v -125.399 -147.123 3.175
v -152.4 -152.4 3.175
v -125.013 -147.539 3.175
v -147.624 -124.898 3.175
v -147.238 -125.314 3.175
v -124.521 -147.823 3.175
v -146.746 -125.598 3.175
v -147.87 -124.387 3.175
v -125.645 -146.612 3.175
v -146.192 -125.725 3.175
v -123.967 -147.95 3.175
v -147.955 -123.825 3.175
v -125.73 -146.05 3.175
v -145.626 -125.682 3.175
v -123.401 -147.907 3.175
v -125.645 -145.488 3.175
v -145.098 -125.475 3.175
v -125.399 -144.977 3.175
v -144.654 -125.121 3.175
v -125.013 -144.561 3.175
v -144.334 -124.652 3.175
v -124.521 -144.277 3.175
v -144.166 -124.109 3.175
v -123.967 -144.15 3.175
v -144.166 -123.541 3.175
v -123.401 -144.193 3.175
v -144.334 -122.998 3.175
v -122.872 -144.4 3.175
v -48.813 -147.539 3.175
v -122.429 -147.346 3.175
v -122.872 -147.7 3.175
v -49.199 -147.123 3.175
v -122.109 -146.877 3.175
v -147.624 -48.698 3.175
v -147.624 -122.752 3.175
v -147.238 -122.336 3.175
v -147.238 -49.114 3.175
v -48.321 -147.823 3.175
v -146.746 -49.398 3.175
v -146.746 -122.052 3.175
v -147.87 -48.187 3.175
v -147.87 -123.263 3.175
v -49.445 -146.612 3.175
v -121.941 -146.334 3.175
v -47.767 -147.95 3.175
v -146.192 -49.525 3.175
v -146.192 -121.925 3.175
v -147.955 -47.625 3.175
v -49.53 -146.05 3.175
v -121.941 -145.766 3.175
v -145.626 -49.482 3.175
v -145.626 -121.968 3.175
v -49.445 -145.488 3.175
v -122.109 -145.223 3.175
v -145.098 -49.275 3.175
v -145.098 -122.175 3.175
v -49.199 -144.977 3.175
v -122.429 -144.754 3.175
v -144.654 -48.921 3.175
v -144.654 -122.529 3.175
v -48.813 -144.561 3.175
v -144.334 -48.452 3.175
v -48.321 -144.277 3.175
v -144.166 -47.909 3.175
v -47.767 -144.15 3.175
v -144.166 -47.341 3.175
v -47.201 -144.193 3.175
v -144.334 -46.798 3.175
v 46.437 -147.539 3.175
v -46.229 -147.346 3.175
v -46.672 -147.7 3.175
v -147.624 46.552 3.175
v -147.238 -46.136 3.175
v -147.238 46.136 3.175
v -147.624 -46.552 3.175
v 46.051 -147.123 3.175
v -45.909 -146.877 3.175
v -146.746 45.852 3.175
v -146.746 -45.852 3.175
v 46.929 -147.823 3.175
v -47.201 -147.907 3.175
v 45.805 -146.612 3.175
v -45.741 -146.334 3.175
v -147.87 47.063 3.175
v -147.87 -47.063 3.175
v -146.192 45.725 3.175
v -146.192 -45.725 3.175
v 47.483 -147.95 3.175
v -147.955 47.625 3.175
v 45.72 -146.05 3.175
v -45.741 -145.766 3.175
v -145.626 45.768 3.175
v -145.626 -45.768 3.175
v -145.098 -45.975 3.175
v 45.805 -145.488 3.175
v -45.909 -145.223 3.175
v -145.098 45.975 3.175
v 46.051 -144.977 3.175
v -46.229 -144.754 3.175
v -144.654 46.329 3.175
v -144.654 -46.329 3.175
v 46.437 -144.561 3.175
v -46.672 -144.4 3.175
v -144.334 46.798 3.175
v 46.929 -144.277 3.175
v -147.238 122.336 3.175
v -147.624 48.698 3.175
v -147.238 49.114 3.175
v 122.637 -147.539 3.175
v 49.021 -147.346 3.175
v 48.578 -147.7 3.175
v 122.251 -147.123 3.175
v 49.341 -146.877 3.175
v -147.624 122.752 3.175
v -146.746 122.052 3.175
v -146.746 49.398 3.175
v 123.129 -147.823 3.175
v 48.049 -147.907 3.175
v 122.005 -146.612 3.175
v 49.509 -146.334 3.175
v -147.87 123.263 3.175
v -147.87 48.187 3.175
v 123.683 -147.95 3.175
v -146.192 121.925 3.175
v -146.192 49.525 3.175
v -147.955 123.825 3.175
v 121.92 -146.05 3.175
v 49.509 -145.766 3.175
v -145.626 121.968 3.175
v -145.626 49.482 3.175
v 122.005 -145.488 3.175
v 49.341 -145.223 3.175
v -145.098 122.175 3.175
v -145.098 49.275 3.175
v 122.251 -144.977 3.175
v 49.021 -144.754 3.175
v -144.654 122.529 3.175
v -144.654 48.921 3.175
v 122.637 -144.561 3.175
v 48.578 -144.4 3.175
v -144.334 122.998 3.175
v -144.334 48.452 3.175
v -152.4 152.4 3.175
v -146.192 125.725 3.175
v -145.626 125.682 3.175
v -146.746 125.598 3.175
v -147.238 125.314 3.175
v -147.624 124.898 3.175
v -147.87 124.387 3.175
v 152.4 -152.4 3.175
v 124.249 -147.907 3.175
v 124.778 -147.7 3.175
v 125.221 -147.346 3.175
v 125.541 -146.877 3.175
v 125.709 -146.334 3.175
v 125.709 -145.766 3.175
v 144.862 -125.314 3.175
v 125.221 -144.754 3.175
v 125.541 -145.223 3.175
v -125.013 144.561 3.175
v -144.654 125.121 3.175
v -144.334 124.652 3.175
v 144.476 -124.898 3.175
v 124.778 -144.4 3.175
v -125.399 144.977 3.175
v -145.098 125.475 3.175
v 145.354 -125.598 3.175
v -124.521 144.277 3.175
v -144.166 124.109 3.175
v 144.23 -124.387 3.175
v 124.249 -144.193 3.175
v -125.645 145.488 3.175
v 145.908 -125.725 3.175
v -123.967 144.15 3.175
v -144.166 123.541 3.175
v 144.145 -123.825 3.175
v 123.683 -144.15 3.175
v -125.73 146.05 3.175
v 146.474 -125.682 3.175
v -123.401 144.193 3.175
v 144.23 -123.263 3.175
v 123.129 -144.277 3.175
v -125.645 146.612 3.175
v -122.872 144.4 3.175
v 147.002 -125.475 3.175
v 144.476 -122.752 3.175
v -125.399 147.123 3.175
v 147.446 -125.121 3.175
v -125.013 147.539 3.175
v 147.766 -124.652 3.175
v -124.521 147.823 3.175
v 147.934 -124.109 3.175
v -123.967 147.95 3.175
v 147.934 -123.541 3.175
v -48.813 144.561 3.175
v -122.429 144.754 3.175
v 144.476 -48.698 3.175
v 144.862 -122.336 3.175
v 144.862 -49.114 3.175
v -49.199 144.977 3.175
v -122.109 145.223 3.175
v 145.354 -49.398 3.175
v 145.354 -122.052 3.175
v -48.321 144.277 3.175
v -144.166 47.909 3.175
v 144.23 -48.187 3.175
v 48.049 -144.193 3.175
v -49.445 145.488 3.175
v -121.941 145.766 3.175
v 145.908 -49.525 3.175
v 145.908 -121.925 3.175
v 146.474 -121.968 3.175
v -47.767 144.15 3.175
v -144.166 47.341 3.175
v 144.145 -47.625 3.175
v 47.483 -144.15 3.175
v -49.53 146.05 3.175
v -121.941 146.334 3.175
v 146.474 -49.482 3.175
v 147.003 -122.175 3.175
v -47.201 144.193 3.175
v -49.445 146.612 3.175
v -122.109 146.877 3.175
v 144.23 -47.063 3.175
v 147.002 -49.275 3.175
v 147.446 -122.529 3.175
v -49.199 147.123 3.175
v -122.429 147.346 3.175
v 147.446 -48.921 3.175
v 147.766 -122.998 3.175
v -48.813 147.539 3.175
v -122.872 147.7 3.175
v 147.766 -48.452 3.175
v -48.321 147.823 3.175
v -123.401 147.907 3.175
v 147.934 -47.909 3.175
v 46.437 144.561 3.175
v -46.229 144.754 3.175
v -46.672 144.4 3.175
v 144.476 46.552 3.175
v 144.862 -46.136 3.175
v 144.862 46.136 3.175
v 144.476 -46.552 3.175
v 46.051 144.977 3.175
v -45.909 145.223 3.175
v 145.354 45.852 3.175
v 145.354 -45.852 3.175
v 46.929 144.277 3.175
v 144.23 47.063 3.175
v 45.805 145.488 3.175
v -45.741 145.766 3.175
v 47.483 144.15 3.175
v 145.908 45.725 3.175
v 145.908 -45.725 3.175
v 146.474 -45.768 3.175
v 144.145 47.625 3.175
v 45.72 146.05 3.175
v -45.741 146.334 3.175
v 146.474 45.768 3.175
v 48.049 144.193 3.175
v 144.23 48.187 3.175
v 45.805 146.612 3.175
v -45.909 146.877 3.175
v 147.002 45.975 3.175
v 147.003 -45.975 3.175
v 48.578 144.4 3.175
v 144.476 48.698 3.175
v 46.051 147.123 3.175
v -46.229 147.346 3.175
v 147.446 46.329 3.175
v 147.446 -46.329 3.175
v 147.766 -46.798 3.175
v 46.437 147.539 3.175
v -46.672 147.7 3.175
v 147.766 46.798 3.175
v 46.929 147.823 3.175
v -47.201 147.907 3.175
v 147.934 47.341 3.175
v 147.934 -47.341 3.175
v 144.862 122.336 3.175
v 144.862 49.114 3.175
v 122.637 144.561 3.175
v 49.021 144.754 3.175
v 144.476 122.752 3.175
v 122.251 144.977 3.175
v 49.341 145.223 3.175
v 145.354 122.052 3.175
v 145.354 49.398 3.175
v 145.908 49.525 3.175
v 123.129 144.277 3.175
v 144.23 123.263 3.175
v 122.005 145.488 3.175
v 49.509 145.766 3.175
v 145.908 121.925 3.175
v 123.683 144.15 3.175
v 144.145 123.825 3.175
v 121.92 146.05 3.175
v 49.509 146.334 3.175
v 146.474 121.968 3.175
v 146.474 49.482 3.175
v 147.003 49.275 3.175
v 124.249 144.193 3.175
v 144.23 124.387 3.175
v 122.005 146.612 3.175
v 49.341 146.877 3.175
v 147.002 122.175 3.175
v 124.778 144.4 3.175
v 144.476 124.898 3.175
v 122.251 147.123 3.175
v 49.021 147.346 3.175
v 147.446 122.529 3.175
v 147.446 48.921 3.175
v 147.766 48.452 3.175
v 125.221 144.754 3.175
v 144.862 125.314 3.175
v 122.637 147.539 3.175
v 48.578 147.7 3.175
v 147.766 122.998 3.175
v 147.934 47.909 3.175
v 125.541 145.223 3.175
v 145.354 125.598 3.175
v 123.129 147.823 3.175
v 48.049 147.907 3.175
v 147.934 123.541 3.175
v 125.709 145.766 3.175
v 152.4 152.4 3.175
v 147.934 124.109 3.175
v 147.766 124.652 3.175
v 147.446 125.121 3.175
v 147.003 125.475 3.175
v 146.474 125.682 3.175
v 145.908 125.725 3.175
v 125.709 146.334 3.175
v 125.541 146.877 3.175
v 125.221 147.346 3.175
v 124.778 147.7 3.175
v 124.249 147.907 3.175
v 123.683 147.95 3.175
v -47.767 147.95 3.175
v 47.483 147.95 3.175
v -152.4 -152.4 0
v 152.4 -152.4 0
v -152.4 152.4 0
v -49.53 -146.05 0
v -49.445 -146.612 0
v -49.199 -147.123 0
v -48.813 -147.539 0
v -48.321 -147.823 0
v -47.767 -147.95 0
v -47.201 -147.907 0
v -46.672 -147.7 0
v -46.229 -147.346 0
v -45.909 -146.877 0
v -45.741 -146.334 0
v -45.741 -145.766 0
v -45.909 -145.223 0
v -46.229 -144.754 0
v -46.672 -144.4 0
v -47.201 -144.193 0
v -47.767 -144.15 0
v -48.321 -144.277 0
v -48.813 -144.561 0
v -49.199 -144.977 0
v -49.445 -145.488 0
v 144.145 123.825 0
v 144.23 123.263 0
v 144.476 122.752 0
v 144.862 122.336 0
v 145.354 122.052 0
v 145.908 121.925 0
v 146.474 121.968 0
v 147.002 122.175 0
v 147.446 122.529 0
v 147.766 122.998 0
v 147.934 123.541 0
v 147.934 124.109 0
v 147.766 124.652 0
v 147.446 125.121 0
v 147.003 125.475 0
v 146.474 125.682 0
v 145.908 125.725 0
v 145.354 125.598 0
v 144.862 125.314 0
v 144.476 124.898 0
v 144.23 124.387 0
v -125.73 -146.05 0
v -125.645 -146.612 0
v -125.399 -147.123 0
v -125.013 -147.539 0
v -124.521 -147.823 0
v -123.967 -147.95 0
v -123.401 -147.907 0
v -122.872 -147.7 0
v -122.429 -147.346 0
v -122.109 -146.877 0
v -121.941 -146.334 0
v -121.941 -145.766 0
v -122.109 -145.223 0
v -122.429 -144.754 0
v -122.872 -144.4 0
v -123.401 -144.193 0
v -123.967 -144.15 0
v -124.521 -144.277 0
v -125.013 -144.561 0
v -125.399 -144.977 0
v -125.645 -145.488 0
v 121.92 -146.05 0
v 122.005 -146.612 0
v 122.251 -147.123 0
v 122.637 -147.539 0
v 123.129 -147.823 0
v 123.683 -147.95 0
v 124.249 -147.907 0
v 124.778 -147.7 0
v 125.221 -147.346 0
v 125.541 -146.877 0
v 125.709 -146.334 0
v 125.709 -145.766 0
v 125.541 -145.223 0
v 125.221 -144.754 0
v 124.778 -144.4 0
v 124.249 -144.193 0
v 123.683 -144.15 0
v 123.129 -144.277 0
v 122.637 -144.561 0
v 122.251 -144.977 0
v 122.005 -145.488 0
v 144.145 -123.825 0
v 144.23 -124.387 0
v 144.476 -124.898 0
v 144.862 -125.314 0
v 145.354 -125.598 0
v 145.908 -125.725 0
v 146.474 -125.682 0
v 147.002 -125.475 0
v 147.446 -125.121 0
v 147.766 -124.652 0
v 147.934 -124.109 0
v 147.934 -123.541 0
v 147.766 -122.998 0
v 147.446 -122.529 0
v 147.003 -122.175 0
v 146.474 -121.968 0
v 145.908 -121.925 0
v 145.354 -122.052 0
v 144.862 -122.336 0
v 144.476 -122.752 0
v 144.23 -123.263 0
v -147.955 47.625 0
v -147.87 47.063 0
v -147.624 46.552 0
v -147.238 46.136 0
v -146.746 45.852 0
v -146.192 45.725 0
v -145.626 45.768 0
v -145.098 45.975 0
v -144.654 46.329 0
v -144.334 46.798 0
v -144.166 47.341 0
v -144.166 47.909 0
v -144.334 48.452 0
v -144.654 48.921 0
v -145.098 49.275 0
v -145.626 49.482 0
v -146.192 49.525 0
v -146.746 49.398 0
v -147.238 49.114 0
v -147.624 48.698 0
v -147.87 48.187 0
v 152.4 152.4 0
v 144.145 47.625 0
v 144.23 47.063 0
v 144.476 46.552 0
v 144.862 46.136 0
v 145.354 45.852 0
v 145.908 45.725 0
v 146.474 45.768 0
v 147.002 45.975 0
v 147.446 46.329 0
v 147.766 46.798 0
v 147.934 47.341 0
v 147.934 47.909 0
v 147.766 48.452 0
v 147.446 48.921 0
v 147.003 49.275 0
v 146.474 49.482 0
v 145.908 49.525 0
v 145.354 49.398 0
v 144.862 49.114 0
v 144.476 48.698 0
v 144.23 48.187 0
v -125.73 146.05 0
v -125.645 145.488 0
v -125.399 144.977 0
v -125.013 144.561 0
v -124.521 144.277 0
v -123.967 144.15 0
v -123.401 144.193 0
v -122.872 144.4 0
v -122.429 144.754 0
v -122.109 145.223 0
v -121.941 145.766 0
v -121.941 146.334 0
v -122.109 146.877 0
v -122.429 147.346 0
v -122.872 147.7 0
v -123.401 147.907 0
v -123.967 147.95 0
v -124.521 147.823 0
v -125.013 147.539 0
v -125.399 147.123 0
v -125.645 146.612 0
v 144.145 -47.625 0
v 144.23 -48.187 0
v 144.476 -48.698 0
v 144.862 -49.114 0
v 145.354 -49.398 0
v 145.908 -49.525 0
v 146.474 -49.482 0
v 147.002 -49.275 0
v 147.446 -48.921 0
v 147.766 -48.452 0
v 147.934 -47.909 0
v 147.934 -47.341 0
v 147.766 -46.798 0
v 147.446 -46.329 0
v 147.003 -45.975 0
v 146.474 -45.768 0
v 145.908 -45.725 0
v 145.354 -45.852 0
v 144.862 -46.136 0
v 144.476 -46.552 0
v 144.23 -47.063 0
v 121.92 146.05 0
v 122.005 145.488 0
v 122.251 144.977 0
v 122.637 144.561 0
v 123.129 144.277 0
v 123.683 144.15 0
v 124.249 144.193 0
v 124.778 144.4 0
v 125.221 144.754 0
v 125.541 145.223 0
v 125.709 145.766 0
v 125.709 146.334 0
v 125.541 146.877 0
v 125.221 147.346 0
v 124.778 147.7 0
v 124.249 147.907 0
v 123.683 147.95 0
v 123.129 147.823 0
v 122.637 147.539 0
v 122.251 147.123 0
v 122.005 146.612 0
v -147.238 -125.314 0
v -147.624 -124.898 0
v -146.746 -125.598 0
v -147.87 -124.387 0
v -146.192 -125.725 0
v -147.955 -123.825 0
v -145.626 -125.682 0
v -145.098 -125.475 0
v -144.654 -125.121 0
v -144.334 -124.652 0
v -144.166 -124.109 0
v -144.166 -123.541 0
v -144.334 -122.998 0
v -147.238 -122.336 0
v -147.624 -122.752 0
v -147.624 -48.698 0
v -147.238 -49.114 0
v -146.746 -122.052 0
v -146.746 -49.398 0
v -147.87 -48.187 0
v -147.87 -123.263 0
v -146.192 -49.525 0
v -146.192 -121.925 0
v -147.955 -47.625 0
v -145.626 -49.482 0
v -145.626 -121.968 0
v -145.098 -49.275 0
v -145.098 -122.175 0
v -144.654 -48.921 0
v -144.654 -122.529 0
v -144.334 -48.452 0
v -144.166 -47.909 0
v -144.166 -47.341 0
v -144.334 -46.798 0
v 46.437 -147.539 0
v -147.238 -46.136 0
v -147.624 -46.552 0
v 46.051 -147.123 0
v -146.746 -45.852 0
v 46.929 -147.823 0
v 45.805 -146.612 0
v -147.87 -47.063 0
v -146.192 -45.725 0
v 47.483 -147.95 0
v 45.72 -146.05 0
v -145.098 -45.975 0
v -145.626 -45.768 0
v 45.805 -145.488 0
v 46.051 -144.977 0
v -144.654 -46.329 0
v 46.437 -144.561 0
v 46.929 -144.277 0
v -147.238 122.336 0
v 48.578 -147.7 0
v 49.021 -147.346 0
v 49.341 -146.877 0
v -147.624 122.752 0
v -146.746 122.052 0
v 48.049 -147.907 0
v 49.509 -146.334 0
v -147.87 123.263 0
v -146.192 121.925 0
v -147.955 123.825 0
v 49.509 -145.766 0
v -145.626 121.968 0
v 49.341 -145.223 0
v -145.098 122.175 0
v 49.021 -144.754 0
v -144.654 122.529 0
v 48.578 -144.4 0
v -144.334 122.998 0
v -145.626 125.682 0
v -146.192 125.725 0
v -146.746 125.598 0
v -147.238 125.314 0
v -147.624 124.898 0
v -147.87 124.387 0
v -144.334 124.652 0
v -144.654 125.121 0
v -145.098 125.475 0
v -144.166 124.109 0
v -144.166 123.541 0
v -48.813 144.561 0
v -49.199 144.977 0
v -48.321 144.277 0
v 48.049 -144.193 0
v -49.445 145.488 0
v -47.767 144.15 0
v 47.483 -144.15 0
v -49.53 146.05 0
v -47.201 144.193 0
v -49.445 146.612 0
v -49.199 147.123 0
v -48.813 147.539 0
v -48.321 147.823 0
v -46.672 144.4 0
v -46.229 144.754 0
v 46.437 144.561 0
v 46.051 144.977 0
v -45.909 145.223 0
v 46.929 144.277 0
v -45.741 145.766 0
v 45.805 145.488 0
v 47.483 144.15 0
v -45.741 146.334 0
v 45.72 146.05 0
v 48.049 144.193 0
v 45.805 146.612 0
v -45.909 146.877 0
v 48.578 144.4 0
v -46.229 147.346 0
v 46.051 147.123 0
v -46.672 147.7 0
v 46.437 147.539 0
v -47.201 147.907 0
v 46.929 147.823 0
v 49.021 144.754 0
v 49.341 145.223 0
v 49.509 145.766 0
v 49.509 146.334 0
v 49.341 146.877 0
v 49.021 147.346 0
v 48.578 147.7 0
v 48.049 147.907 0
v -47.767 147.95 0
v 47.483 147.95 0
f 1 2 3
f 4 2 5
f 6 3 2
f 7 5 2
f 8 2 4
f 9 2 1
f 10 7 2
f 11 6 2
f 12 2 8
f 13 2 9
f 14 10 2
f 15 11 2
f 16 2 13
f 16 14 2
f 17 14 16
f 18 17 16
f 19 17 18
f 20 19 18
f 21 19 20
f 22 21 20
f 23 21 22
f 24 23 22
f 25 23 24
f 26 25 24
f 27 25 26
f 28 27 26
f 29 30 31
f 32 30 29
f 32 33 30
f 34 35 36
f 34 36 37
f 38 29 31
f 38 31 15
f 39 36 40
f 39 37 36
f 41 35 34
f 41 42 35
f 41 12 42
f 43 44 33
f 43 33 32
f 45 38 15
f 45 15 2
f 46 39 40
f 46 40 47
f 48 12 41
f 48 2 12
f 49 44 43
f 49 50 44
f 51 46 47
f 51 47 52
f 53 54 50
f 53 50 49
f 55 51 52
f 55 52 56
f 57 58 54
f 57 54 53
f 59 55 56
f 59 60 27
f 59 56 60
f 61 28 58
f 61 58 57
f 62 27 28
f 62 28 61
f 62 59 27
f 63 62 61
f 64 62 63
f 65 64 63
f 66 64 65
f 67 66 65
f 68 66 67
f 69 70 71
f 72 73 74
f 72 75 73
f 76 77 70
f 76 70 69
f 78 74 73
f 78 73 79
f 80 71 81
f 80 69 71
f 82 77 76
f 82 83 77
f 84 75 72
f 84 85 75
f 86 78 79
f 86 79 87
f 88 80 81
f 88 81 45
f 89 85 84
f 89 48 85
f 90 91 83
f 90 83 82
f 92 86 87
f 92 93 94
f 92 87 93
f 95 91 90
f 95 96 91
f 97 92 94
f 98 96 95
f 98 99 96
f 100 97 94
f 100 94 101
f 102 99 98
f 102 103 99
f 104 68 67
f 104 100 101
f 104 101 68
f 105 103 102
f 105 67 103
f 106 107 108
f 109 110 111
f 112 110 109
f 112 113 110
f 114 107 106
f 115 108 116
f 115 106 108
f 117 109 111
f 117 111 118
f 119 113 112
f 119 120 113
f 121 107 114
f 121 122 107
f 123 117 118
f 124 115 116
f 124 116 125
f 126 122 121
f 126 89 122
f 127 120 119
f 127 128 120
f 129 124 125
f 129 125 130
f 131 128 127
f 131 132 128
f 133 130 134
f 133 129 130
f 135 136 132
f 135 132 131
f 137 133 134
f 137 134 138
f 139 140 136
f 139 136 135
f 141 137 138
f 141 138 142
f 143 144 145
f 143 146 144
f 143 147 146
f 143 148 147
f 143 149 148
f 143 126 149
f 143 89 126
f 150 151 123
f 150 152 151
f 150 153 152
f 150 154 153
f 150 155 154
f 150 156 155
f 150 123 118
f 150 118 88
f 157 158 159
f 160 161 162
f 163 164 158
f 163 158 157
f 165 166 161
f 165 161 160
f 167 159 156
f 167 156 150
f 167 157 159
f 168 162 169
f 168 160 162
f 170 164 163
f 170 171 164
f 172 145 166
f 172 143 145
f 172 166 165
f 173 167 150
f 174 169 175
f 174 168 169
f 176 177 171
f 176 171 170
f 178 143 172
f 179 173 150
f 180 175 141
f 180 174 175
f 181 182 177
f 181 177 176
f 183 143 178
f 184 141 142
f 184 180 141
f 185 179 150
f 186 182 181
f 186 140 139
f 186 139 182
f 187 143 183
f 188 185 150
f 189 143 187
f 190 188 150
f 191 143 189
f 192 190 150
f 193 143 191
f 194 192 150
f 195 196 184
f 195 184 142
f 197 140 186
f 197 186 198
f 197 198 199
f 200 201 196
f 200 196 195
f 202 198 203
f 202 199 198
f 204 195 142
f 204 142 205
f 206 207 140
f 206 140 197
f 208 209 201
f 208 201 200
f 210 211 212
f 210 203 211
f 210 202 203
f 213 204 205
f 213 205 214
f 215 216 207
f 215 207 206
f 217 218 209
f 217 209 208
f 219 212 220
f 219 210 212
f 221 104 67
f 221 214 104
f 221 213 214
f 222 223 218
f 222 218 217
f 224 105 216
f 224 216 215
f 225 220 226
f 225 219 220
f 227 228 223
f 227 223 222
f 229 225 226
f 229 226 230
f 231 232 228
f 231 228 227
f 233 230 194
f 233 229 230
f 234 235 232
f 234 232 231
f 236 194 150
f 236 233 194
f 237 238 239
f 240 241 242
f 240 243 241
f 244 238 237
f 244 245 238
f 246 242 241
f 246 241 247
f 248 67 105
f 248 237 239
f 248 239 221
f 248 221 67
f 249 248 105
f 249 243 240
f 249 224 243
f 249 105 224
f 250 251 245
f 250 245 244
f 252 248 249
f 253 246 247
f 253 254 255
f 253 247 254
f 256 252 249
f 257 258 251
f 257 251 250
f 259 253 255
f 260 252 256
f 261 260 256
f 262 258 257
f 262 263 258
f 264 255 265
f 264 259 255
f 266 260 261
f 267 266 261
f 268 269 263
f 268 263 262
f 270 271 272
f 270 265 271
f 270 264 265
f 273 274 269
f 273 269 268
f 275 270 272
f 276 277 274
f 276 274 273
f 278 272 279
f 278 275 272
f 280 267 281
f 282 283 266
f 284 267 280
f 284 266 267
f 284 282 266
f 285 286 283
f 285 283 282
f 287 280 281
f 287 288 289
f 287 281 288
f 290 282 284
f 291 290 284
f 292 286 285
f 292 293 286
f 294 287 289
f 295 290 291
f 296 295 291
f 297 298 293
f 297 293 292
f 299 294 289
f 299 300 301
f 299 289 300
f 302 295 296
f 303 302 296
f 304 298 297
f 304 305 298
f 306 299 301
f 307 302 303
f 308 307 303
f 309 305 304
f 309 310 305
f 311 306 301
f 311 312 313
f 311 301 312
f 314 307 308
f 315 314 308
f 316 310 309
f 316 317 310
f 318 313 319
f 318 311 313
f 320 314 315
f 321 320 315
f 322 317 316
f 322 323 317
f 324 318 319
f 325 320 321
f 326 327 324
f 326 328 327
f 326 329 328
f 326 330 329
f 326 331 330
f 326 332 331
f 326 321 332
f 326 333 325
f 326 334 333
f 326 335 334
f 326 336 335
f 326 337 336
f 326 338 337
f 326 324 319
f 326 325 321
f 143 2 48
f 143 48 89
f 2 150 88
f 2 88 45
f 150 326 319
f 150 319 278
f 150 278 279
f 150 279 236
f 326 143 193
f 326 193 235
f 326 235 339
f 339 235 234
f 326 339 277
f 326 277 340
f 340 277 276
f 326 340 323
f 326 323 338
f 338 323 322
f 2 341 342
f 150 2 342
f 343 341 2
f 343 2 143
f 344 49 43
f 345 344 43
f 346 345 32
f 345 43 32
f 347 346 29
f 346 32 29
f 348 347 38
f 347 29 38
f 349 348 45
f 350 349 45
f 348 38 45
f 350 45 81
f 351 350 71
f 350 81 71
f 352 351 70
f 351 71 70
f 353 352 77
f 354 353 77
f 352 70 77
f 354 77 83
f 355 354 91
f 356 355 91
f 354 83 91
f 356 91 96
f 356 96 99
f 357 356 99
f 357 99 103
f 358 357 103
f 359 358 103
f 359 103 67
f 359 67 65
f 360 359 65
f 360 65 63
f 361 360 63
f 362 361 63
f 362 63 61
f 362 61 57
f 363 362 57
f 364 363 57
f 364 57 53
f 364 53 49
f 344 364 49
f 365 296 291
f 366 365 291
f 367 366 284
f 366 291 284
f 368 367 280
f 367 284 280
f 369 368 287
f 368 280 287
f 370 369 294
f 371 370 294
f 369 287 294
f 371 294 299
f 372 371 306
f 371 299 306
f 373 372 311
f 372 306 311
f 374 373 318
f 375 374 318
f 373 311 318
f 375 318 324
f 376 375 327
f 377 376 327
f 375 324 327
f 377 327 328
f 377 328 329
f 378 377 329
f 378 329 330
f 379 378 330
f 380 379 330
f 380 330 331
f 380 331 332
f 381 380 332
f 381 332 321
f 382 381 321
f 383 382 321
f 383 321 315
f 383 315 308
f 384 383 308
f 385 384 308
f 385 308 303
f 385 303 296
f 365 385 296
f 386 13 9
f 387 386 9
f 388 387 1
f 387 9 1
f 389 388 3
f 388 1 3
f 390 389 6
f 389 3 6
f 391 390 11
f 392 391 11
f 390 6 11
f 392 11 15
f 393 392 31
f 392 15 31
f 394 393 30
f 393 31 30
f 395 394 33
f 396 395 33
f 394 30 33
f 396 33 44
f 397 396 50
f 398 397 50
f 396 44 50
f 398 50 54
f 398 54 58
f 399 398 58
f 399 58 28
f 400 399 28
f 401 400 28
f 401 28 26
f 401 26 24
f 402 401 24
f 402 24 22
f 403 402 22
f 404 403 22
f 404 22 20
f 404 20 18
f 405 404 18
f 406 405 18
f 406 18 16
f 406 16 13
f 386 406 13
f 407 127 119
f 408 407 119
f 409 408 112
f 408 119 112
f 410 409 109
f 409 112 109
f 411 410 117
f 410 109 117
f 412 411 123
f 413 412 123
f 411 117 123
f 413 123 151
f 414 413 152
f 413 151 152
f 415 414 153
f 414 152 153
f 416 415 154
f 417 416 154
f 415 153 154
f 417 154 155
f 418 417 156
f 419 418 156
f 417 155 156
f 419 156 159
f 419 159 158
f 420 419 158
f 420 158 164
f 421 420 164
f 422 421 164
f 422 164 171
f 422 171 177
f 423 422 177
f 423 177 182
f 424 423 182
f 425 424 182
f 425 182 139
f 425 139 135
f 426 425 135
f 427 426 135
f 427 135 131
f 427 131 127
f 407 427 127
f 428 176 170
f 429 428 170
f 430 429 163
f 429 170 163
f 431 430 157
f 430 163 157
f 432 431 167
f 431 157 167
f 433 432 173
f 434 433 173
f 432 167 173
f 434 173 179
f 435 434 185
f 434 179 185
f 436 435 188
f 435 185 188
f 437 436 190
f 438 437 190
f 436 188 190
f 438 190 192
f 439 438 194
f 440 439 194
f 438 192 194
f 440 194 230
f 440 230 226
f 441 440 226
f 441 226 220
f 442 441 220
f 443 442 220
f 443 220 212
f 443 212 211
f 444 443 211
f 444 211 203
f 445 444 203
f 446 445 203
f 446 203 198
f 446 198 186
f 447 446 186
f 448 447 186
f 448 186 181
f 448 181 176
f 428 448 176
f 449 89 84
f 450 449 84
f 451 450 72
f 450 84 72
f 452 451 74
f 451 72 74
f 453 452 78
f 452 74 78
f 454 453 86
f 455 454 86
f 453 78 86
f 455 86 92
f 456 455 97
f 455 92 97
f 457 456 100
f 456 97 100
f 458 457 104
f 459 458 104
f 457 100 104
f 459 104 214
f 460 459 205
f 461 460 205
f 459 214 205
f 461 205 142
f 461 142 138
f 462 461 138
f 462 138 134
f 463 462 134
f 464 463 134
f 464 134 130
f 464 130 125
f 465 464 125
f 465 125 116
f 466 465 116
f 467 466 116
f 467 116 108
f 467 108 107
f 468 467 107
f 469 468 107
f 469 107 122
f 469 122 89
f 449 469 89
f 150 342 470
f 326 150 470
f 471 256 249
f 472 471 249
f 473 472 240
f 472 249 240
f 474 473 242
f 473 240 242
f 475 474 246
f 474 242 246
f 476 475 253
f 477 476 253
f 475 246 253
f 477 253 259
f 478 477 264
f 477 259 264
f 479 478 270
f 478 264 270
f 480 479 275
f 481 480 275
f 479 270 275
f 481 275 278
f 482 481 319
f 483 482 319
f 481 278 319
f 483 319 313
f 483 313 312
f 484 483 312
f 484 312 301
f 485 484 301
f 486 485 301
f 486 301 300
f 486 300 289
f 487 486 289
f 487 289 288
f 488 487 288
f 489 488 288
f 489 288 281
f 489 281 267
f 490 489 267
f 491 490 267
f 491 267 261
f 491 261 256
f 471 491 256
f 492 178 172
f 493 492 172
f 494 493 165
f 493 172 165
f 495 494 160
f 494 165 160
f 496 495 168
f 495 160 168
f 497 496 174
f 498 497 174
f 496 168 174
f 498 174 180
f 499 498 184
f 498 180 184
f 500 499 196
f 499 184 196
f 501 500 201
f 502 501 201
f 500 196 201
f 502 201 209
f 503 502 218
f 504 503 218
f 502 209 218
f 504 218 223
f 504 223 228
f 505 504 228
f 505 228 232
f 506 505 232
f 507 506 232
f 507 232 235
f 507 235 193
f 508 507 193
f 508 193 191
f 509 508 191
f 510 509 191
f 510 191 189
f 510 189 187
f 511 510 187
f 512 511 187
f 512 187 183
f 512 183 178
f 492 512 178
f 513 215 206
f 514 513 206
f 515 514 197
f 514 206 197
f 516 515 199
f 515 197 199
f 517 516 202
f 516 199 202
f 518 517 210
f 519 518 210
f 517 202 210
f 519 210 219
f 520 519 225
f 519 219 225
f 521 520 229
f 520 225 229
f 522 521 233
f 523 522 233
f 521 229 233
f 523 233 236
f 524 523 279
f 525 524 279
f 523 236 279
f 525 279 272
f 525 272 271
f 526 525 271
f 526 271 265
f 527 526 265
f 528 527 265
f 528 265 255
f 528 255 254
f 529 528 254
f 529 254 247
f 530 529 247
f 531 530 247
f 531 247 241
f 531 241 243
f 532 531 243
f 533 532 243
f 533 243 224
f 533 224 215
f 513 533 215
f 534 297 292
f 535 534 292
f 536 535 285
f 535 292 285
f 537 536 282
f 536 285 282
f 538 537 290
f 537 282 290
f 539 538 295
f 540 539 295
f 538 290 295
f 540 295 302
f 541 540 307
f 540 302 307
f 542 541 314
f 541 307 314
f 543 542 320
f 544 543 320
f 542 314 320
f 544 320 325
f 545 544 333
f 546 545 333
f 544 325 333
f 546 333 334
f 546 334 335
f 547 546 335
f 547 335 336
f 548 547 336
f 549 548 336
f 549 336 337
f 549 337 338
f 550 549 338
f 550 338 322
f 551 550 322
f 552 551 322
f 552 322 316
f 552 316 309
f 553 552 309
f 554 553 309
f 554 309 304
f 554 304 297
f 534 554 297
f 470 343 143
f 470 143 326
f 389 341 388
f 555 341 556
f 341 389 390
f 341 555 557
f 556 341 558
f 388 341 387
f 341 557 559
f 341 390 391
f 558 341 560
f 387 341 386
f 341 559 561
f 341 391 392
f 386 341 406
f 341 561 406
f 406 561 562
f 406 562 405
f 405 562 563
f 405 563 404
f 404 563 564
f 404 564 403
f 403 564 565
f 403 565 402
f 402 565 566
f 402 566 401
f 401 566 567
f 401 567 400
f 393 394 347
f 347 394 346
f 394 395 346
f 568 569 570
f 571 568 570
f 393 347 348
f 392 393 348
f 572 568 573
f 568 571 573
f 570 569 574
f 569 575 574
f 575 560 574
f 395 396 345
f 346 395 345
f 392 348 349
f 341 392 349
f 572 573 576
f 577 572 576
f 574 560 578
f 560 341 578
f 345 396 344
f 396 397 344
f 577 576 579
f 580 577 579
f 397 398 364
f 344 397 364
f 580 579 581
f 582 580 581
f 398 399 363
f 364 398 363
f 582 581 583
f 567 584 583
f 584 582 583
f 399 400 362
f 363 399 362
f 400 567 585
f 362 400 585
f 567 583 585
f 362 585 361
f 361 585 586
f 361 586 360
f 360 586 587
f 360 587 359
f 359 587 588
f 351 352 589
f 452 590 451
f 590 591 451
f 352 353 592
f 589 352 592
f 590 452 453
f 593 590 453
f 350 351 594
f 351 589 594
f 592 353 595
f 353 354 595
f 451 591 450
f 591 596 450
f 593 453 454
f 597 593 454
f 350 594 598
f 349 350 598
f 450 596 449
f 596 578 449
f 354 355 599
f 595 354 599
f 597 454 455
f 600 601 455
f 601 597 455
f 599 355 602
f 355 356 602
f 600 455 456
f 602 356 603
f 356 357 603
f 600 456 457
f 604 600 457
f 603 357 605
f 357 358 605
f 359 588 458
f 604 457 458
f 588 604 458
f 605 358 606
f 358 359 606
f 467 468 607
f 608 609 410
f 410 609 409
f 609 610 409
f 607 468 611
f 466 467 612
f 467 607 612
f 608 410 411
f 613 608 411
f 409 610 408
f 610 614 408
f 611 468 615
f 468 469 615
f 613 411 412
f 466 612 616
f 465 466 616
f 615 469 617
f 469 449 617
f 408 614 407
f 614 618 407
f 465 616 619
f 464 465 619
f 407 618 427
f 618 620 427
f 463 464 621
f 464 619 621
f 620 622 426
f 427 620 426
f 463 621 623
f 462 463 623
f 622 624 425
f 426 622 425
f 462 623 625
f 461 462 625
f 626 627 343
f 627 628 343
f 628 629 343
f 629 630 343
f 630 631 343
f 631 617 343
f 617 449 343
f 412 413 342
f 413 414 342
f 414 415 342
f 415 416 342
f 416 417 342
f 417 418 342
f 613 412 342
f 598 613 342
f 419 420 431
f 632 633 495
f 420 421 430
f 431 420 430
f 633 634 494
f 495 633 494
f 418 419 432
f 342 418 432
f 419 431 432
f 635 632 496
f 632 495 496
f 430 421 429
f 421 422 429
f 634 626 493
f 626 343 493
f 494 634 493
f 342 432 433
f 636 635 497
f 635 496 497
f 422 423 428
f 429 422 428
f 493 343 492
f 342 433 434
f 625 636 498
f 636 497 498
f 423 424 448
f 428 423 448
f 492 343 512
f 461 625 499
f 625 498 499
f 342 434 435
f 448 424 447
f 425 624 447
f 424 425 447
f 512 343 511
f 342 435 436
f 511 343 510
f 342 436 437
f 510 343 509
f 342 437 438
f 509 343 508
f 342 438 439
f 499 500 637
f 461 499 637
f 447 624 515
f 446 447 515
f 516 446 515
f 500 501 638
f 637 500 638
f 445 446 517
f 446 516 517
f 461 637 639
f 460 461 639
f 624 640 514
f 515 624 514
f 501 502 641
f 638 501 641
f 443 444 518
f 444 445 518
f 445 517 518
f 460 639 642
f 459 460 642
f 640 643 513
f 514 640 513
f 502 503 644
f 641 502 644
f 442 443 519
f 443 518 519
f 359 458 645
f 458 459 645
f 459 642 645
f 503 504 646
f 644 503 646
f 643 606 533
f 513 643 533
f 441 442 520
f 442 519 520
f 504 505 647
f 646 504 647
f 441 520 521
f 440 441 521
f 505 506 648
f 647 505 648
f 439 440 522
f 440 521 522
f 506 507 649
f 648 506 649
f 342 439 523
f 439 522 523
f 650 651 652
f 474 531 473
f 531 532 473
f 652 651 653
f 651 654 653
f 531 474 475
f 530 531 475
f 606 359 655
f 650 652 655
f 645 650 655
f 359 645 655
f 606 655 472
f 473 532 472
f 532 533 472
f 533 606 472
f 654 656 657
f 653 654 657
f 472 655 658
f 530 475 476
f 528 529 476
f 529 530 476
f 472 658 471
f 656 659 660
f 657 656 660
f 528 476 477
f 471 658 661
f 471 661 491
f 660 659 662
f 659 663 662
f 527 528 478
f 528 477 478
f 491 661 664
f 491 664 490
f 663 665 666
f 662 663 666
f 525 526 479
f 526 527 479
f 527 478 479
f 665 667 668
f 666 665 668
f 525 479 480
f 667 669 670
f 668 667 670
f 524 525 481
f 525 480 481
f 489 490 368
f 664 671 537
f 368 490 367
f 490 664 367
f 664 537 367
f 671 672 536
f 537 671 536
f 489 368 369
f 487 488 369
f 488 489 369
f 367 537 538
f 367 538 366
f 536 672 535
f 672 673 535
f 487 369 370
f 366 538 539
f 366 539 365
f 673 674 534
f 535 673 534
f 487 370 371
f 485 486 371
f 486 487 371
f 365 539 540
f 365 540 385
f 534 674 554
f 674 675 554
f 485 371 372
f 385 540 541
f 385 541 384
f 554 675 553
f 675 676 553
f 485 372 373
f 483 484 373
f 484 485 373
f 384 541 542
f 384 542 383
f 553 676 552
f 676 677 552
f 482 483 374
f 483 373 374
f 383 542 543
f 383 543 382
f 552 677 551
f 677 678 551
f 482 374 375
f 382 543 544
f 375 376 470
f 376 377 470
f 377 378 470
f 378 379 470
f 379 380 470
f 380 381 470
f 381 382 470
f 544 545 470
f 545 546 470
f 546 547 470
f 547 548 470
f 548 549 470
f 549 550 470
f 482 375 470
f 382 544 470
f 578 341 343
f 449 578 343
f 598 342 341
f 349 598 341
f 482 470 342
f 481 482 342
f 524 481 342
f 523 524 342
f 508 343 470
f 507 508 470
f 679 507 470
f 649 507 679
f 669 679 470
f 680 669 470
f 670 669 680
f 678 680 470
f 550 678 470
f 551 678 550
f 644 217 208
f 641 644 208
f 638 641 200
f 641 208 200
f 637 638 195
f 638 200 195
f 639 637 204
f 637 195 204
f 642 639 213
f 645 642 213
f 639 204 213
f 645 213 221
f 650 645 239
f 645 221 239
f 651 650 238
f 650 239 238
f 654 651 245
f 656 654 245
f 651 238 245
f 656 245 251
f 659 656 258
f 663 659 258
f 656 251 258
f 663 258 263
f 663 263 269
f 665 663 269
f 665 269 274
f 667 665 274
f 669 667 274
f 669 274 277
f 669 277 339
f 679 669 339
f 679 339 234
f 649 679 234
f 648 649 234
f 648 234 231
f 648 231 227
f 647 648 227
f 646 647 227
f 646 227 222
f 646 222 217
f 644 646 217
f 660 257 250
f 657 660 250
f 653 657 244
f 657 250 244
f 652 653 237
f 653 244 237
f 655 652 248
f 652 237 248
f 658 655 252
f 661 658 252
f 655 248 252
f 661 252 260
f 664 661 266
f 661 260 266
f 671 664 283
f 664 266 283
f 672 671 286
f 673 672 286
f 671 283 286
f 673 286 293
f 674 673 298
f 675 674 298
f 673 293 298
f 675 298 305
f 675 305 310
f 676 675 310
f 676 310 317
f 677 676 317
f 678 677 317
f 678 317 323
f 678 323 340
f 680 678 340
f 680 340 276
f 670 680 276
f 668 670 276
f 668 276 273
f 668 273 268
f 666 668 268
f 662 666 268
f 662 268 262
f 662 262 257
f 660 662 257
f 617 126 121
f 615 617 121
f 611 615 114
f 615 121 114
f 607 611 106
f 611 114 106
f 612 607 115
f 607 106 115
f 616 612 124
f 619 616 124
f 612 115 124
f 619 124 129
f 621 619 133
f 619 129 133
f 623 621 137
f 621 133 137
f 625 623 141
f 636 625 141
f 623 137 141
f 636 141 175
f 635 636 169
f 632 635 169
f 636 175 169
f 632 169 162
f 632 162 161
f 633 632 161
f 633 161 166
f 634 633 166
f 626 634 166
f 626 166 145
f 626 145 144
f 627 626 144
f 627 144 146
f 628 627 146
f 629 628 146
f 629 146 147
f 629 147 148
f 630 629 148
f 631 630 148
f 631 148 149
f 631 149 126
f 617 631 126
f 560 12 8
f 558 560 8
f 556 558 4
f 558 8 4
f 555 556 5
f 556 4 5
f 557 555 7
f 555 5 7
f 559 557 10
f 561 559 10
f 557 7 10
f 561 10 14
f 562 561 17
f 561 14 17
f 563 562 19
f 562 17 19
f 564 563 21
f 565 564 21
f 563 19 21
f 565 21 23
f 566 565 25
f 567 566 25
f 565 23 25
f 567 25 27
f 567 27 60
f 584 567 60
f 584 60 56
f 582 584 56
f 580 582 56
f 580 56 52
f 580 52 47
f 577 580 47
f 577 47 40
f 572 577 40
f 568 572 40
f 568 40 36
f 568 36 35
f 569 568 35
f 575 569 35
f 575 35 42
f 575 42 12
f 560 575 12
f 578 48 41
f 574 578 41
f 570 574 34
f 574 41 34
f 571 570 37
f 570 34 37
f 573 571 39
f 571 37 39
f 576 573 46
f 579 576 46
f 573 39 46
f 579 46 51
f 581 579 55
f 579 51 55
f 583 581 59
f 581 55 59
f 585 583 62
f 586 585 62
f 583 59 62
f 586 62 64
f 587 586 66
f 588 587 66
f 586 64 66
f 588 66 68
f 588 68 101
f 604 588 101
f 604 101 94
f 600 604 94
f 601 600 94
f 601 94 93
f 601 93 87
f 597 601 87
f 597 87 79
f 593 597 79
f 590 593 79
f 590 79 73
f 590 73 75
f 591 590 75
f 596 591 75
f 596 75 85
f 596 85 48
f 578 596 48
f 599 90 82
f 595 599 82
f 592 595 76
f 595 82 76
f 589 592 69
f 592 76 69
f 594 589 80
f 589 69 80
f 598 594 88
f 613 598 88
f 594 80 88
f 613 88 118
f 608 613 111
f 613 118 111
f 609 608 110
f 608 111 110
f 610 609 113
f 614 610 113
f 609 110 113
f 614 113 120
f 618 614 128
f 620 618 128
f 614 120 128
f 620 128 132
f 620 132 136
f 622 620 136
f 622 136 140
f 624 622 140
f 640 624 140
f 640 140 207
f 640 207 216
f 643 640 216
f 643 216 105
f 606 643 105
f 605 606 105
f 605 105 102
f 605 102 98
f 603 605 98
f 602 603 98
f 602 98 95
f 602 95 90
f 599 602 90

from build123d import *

# Parameters (mm, degrees)
F0_W     = 304.8
F0_H     = 304.8
F1_DEPTH = 3.175
F2_D     = 3.81


with BuildPart() as f1:
    # F0 (on Top) → F1 (new body)
    with BuildSketch(Plane.XY):
        Rectangle(F0_W, F0_H)
    extrude(amount=F1_DEPTH)

    # F2 (through all)
    with Locations(Plane(origin=(0, 0, 0), x_dir=(1, 0, 0), z_dir=(0, 0, -1))):
        with Locations((-146.05, 123.825), (-123.825, 146.05), (123.825, 146.05), (146.05, -123.825), (123.825, -146.05), (-146.05, -123.825), (-123.825, -146.05), (-146.05, 47.625), (-146.05, -47.625), (-47.625, -146.05), (47.625, -146.05), (146.05, -47.625), (146.05, 47.625), (47.625, 146.05), (-47.625, 146.05), (146.05, 123.825)):
            Hole(F2_D / 2)


solid = f1.part
